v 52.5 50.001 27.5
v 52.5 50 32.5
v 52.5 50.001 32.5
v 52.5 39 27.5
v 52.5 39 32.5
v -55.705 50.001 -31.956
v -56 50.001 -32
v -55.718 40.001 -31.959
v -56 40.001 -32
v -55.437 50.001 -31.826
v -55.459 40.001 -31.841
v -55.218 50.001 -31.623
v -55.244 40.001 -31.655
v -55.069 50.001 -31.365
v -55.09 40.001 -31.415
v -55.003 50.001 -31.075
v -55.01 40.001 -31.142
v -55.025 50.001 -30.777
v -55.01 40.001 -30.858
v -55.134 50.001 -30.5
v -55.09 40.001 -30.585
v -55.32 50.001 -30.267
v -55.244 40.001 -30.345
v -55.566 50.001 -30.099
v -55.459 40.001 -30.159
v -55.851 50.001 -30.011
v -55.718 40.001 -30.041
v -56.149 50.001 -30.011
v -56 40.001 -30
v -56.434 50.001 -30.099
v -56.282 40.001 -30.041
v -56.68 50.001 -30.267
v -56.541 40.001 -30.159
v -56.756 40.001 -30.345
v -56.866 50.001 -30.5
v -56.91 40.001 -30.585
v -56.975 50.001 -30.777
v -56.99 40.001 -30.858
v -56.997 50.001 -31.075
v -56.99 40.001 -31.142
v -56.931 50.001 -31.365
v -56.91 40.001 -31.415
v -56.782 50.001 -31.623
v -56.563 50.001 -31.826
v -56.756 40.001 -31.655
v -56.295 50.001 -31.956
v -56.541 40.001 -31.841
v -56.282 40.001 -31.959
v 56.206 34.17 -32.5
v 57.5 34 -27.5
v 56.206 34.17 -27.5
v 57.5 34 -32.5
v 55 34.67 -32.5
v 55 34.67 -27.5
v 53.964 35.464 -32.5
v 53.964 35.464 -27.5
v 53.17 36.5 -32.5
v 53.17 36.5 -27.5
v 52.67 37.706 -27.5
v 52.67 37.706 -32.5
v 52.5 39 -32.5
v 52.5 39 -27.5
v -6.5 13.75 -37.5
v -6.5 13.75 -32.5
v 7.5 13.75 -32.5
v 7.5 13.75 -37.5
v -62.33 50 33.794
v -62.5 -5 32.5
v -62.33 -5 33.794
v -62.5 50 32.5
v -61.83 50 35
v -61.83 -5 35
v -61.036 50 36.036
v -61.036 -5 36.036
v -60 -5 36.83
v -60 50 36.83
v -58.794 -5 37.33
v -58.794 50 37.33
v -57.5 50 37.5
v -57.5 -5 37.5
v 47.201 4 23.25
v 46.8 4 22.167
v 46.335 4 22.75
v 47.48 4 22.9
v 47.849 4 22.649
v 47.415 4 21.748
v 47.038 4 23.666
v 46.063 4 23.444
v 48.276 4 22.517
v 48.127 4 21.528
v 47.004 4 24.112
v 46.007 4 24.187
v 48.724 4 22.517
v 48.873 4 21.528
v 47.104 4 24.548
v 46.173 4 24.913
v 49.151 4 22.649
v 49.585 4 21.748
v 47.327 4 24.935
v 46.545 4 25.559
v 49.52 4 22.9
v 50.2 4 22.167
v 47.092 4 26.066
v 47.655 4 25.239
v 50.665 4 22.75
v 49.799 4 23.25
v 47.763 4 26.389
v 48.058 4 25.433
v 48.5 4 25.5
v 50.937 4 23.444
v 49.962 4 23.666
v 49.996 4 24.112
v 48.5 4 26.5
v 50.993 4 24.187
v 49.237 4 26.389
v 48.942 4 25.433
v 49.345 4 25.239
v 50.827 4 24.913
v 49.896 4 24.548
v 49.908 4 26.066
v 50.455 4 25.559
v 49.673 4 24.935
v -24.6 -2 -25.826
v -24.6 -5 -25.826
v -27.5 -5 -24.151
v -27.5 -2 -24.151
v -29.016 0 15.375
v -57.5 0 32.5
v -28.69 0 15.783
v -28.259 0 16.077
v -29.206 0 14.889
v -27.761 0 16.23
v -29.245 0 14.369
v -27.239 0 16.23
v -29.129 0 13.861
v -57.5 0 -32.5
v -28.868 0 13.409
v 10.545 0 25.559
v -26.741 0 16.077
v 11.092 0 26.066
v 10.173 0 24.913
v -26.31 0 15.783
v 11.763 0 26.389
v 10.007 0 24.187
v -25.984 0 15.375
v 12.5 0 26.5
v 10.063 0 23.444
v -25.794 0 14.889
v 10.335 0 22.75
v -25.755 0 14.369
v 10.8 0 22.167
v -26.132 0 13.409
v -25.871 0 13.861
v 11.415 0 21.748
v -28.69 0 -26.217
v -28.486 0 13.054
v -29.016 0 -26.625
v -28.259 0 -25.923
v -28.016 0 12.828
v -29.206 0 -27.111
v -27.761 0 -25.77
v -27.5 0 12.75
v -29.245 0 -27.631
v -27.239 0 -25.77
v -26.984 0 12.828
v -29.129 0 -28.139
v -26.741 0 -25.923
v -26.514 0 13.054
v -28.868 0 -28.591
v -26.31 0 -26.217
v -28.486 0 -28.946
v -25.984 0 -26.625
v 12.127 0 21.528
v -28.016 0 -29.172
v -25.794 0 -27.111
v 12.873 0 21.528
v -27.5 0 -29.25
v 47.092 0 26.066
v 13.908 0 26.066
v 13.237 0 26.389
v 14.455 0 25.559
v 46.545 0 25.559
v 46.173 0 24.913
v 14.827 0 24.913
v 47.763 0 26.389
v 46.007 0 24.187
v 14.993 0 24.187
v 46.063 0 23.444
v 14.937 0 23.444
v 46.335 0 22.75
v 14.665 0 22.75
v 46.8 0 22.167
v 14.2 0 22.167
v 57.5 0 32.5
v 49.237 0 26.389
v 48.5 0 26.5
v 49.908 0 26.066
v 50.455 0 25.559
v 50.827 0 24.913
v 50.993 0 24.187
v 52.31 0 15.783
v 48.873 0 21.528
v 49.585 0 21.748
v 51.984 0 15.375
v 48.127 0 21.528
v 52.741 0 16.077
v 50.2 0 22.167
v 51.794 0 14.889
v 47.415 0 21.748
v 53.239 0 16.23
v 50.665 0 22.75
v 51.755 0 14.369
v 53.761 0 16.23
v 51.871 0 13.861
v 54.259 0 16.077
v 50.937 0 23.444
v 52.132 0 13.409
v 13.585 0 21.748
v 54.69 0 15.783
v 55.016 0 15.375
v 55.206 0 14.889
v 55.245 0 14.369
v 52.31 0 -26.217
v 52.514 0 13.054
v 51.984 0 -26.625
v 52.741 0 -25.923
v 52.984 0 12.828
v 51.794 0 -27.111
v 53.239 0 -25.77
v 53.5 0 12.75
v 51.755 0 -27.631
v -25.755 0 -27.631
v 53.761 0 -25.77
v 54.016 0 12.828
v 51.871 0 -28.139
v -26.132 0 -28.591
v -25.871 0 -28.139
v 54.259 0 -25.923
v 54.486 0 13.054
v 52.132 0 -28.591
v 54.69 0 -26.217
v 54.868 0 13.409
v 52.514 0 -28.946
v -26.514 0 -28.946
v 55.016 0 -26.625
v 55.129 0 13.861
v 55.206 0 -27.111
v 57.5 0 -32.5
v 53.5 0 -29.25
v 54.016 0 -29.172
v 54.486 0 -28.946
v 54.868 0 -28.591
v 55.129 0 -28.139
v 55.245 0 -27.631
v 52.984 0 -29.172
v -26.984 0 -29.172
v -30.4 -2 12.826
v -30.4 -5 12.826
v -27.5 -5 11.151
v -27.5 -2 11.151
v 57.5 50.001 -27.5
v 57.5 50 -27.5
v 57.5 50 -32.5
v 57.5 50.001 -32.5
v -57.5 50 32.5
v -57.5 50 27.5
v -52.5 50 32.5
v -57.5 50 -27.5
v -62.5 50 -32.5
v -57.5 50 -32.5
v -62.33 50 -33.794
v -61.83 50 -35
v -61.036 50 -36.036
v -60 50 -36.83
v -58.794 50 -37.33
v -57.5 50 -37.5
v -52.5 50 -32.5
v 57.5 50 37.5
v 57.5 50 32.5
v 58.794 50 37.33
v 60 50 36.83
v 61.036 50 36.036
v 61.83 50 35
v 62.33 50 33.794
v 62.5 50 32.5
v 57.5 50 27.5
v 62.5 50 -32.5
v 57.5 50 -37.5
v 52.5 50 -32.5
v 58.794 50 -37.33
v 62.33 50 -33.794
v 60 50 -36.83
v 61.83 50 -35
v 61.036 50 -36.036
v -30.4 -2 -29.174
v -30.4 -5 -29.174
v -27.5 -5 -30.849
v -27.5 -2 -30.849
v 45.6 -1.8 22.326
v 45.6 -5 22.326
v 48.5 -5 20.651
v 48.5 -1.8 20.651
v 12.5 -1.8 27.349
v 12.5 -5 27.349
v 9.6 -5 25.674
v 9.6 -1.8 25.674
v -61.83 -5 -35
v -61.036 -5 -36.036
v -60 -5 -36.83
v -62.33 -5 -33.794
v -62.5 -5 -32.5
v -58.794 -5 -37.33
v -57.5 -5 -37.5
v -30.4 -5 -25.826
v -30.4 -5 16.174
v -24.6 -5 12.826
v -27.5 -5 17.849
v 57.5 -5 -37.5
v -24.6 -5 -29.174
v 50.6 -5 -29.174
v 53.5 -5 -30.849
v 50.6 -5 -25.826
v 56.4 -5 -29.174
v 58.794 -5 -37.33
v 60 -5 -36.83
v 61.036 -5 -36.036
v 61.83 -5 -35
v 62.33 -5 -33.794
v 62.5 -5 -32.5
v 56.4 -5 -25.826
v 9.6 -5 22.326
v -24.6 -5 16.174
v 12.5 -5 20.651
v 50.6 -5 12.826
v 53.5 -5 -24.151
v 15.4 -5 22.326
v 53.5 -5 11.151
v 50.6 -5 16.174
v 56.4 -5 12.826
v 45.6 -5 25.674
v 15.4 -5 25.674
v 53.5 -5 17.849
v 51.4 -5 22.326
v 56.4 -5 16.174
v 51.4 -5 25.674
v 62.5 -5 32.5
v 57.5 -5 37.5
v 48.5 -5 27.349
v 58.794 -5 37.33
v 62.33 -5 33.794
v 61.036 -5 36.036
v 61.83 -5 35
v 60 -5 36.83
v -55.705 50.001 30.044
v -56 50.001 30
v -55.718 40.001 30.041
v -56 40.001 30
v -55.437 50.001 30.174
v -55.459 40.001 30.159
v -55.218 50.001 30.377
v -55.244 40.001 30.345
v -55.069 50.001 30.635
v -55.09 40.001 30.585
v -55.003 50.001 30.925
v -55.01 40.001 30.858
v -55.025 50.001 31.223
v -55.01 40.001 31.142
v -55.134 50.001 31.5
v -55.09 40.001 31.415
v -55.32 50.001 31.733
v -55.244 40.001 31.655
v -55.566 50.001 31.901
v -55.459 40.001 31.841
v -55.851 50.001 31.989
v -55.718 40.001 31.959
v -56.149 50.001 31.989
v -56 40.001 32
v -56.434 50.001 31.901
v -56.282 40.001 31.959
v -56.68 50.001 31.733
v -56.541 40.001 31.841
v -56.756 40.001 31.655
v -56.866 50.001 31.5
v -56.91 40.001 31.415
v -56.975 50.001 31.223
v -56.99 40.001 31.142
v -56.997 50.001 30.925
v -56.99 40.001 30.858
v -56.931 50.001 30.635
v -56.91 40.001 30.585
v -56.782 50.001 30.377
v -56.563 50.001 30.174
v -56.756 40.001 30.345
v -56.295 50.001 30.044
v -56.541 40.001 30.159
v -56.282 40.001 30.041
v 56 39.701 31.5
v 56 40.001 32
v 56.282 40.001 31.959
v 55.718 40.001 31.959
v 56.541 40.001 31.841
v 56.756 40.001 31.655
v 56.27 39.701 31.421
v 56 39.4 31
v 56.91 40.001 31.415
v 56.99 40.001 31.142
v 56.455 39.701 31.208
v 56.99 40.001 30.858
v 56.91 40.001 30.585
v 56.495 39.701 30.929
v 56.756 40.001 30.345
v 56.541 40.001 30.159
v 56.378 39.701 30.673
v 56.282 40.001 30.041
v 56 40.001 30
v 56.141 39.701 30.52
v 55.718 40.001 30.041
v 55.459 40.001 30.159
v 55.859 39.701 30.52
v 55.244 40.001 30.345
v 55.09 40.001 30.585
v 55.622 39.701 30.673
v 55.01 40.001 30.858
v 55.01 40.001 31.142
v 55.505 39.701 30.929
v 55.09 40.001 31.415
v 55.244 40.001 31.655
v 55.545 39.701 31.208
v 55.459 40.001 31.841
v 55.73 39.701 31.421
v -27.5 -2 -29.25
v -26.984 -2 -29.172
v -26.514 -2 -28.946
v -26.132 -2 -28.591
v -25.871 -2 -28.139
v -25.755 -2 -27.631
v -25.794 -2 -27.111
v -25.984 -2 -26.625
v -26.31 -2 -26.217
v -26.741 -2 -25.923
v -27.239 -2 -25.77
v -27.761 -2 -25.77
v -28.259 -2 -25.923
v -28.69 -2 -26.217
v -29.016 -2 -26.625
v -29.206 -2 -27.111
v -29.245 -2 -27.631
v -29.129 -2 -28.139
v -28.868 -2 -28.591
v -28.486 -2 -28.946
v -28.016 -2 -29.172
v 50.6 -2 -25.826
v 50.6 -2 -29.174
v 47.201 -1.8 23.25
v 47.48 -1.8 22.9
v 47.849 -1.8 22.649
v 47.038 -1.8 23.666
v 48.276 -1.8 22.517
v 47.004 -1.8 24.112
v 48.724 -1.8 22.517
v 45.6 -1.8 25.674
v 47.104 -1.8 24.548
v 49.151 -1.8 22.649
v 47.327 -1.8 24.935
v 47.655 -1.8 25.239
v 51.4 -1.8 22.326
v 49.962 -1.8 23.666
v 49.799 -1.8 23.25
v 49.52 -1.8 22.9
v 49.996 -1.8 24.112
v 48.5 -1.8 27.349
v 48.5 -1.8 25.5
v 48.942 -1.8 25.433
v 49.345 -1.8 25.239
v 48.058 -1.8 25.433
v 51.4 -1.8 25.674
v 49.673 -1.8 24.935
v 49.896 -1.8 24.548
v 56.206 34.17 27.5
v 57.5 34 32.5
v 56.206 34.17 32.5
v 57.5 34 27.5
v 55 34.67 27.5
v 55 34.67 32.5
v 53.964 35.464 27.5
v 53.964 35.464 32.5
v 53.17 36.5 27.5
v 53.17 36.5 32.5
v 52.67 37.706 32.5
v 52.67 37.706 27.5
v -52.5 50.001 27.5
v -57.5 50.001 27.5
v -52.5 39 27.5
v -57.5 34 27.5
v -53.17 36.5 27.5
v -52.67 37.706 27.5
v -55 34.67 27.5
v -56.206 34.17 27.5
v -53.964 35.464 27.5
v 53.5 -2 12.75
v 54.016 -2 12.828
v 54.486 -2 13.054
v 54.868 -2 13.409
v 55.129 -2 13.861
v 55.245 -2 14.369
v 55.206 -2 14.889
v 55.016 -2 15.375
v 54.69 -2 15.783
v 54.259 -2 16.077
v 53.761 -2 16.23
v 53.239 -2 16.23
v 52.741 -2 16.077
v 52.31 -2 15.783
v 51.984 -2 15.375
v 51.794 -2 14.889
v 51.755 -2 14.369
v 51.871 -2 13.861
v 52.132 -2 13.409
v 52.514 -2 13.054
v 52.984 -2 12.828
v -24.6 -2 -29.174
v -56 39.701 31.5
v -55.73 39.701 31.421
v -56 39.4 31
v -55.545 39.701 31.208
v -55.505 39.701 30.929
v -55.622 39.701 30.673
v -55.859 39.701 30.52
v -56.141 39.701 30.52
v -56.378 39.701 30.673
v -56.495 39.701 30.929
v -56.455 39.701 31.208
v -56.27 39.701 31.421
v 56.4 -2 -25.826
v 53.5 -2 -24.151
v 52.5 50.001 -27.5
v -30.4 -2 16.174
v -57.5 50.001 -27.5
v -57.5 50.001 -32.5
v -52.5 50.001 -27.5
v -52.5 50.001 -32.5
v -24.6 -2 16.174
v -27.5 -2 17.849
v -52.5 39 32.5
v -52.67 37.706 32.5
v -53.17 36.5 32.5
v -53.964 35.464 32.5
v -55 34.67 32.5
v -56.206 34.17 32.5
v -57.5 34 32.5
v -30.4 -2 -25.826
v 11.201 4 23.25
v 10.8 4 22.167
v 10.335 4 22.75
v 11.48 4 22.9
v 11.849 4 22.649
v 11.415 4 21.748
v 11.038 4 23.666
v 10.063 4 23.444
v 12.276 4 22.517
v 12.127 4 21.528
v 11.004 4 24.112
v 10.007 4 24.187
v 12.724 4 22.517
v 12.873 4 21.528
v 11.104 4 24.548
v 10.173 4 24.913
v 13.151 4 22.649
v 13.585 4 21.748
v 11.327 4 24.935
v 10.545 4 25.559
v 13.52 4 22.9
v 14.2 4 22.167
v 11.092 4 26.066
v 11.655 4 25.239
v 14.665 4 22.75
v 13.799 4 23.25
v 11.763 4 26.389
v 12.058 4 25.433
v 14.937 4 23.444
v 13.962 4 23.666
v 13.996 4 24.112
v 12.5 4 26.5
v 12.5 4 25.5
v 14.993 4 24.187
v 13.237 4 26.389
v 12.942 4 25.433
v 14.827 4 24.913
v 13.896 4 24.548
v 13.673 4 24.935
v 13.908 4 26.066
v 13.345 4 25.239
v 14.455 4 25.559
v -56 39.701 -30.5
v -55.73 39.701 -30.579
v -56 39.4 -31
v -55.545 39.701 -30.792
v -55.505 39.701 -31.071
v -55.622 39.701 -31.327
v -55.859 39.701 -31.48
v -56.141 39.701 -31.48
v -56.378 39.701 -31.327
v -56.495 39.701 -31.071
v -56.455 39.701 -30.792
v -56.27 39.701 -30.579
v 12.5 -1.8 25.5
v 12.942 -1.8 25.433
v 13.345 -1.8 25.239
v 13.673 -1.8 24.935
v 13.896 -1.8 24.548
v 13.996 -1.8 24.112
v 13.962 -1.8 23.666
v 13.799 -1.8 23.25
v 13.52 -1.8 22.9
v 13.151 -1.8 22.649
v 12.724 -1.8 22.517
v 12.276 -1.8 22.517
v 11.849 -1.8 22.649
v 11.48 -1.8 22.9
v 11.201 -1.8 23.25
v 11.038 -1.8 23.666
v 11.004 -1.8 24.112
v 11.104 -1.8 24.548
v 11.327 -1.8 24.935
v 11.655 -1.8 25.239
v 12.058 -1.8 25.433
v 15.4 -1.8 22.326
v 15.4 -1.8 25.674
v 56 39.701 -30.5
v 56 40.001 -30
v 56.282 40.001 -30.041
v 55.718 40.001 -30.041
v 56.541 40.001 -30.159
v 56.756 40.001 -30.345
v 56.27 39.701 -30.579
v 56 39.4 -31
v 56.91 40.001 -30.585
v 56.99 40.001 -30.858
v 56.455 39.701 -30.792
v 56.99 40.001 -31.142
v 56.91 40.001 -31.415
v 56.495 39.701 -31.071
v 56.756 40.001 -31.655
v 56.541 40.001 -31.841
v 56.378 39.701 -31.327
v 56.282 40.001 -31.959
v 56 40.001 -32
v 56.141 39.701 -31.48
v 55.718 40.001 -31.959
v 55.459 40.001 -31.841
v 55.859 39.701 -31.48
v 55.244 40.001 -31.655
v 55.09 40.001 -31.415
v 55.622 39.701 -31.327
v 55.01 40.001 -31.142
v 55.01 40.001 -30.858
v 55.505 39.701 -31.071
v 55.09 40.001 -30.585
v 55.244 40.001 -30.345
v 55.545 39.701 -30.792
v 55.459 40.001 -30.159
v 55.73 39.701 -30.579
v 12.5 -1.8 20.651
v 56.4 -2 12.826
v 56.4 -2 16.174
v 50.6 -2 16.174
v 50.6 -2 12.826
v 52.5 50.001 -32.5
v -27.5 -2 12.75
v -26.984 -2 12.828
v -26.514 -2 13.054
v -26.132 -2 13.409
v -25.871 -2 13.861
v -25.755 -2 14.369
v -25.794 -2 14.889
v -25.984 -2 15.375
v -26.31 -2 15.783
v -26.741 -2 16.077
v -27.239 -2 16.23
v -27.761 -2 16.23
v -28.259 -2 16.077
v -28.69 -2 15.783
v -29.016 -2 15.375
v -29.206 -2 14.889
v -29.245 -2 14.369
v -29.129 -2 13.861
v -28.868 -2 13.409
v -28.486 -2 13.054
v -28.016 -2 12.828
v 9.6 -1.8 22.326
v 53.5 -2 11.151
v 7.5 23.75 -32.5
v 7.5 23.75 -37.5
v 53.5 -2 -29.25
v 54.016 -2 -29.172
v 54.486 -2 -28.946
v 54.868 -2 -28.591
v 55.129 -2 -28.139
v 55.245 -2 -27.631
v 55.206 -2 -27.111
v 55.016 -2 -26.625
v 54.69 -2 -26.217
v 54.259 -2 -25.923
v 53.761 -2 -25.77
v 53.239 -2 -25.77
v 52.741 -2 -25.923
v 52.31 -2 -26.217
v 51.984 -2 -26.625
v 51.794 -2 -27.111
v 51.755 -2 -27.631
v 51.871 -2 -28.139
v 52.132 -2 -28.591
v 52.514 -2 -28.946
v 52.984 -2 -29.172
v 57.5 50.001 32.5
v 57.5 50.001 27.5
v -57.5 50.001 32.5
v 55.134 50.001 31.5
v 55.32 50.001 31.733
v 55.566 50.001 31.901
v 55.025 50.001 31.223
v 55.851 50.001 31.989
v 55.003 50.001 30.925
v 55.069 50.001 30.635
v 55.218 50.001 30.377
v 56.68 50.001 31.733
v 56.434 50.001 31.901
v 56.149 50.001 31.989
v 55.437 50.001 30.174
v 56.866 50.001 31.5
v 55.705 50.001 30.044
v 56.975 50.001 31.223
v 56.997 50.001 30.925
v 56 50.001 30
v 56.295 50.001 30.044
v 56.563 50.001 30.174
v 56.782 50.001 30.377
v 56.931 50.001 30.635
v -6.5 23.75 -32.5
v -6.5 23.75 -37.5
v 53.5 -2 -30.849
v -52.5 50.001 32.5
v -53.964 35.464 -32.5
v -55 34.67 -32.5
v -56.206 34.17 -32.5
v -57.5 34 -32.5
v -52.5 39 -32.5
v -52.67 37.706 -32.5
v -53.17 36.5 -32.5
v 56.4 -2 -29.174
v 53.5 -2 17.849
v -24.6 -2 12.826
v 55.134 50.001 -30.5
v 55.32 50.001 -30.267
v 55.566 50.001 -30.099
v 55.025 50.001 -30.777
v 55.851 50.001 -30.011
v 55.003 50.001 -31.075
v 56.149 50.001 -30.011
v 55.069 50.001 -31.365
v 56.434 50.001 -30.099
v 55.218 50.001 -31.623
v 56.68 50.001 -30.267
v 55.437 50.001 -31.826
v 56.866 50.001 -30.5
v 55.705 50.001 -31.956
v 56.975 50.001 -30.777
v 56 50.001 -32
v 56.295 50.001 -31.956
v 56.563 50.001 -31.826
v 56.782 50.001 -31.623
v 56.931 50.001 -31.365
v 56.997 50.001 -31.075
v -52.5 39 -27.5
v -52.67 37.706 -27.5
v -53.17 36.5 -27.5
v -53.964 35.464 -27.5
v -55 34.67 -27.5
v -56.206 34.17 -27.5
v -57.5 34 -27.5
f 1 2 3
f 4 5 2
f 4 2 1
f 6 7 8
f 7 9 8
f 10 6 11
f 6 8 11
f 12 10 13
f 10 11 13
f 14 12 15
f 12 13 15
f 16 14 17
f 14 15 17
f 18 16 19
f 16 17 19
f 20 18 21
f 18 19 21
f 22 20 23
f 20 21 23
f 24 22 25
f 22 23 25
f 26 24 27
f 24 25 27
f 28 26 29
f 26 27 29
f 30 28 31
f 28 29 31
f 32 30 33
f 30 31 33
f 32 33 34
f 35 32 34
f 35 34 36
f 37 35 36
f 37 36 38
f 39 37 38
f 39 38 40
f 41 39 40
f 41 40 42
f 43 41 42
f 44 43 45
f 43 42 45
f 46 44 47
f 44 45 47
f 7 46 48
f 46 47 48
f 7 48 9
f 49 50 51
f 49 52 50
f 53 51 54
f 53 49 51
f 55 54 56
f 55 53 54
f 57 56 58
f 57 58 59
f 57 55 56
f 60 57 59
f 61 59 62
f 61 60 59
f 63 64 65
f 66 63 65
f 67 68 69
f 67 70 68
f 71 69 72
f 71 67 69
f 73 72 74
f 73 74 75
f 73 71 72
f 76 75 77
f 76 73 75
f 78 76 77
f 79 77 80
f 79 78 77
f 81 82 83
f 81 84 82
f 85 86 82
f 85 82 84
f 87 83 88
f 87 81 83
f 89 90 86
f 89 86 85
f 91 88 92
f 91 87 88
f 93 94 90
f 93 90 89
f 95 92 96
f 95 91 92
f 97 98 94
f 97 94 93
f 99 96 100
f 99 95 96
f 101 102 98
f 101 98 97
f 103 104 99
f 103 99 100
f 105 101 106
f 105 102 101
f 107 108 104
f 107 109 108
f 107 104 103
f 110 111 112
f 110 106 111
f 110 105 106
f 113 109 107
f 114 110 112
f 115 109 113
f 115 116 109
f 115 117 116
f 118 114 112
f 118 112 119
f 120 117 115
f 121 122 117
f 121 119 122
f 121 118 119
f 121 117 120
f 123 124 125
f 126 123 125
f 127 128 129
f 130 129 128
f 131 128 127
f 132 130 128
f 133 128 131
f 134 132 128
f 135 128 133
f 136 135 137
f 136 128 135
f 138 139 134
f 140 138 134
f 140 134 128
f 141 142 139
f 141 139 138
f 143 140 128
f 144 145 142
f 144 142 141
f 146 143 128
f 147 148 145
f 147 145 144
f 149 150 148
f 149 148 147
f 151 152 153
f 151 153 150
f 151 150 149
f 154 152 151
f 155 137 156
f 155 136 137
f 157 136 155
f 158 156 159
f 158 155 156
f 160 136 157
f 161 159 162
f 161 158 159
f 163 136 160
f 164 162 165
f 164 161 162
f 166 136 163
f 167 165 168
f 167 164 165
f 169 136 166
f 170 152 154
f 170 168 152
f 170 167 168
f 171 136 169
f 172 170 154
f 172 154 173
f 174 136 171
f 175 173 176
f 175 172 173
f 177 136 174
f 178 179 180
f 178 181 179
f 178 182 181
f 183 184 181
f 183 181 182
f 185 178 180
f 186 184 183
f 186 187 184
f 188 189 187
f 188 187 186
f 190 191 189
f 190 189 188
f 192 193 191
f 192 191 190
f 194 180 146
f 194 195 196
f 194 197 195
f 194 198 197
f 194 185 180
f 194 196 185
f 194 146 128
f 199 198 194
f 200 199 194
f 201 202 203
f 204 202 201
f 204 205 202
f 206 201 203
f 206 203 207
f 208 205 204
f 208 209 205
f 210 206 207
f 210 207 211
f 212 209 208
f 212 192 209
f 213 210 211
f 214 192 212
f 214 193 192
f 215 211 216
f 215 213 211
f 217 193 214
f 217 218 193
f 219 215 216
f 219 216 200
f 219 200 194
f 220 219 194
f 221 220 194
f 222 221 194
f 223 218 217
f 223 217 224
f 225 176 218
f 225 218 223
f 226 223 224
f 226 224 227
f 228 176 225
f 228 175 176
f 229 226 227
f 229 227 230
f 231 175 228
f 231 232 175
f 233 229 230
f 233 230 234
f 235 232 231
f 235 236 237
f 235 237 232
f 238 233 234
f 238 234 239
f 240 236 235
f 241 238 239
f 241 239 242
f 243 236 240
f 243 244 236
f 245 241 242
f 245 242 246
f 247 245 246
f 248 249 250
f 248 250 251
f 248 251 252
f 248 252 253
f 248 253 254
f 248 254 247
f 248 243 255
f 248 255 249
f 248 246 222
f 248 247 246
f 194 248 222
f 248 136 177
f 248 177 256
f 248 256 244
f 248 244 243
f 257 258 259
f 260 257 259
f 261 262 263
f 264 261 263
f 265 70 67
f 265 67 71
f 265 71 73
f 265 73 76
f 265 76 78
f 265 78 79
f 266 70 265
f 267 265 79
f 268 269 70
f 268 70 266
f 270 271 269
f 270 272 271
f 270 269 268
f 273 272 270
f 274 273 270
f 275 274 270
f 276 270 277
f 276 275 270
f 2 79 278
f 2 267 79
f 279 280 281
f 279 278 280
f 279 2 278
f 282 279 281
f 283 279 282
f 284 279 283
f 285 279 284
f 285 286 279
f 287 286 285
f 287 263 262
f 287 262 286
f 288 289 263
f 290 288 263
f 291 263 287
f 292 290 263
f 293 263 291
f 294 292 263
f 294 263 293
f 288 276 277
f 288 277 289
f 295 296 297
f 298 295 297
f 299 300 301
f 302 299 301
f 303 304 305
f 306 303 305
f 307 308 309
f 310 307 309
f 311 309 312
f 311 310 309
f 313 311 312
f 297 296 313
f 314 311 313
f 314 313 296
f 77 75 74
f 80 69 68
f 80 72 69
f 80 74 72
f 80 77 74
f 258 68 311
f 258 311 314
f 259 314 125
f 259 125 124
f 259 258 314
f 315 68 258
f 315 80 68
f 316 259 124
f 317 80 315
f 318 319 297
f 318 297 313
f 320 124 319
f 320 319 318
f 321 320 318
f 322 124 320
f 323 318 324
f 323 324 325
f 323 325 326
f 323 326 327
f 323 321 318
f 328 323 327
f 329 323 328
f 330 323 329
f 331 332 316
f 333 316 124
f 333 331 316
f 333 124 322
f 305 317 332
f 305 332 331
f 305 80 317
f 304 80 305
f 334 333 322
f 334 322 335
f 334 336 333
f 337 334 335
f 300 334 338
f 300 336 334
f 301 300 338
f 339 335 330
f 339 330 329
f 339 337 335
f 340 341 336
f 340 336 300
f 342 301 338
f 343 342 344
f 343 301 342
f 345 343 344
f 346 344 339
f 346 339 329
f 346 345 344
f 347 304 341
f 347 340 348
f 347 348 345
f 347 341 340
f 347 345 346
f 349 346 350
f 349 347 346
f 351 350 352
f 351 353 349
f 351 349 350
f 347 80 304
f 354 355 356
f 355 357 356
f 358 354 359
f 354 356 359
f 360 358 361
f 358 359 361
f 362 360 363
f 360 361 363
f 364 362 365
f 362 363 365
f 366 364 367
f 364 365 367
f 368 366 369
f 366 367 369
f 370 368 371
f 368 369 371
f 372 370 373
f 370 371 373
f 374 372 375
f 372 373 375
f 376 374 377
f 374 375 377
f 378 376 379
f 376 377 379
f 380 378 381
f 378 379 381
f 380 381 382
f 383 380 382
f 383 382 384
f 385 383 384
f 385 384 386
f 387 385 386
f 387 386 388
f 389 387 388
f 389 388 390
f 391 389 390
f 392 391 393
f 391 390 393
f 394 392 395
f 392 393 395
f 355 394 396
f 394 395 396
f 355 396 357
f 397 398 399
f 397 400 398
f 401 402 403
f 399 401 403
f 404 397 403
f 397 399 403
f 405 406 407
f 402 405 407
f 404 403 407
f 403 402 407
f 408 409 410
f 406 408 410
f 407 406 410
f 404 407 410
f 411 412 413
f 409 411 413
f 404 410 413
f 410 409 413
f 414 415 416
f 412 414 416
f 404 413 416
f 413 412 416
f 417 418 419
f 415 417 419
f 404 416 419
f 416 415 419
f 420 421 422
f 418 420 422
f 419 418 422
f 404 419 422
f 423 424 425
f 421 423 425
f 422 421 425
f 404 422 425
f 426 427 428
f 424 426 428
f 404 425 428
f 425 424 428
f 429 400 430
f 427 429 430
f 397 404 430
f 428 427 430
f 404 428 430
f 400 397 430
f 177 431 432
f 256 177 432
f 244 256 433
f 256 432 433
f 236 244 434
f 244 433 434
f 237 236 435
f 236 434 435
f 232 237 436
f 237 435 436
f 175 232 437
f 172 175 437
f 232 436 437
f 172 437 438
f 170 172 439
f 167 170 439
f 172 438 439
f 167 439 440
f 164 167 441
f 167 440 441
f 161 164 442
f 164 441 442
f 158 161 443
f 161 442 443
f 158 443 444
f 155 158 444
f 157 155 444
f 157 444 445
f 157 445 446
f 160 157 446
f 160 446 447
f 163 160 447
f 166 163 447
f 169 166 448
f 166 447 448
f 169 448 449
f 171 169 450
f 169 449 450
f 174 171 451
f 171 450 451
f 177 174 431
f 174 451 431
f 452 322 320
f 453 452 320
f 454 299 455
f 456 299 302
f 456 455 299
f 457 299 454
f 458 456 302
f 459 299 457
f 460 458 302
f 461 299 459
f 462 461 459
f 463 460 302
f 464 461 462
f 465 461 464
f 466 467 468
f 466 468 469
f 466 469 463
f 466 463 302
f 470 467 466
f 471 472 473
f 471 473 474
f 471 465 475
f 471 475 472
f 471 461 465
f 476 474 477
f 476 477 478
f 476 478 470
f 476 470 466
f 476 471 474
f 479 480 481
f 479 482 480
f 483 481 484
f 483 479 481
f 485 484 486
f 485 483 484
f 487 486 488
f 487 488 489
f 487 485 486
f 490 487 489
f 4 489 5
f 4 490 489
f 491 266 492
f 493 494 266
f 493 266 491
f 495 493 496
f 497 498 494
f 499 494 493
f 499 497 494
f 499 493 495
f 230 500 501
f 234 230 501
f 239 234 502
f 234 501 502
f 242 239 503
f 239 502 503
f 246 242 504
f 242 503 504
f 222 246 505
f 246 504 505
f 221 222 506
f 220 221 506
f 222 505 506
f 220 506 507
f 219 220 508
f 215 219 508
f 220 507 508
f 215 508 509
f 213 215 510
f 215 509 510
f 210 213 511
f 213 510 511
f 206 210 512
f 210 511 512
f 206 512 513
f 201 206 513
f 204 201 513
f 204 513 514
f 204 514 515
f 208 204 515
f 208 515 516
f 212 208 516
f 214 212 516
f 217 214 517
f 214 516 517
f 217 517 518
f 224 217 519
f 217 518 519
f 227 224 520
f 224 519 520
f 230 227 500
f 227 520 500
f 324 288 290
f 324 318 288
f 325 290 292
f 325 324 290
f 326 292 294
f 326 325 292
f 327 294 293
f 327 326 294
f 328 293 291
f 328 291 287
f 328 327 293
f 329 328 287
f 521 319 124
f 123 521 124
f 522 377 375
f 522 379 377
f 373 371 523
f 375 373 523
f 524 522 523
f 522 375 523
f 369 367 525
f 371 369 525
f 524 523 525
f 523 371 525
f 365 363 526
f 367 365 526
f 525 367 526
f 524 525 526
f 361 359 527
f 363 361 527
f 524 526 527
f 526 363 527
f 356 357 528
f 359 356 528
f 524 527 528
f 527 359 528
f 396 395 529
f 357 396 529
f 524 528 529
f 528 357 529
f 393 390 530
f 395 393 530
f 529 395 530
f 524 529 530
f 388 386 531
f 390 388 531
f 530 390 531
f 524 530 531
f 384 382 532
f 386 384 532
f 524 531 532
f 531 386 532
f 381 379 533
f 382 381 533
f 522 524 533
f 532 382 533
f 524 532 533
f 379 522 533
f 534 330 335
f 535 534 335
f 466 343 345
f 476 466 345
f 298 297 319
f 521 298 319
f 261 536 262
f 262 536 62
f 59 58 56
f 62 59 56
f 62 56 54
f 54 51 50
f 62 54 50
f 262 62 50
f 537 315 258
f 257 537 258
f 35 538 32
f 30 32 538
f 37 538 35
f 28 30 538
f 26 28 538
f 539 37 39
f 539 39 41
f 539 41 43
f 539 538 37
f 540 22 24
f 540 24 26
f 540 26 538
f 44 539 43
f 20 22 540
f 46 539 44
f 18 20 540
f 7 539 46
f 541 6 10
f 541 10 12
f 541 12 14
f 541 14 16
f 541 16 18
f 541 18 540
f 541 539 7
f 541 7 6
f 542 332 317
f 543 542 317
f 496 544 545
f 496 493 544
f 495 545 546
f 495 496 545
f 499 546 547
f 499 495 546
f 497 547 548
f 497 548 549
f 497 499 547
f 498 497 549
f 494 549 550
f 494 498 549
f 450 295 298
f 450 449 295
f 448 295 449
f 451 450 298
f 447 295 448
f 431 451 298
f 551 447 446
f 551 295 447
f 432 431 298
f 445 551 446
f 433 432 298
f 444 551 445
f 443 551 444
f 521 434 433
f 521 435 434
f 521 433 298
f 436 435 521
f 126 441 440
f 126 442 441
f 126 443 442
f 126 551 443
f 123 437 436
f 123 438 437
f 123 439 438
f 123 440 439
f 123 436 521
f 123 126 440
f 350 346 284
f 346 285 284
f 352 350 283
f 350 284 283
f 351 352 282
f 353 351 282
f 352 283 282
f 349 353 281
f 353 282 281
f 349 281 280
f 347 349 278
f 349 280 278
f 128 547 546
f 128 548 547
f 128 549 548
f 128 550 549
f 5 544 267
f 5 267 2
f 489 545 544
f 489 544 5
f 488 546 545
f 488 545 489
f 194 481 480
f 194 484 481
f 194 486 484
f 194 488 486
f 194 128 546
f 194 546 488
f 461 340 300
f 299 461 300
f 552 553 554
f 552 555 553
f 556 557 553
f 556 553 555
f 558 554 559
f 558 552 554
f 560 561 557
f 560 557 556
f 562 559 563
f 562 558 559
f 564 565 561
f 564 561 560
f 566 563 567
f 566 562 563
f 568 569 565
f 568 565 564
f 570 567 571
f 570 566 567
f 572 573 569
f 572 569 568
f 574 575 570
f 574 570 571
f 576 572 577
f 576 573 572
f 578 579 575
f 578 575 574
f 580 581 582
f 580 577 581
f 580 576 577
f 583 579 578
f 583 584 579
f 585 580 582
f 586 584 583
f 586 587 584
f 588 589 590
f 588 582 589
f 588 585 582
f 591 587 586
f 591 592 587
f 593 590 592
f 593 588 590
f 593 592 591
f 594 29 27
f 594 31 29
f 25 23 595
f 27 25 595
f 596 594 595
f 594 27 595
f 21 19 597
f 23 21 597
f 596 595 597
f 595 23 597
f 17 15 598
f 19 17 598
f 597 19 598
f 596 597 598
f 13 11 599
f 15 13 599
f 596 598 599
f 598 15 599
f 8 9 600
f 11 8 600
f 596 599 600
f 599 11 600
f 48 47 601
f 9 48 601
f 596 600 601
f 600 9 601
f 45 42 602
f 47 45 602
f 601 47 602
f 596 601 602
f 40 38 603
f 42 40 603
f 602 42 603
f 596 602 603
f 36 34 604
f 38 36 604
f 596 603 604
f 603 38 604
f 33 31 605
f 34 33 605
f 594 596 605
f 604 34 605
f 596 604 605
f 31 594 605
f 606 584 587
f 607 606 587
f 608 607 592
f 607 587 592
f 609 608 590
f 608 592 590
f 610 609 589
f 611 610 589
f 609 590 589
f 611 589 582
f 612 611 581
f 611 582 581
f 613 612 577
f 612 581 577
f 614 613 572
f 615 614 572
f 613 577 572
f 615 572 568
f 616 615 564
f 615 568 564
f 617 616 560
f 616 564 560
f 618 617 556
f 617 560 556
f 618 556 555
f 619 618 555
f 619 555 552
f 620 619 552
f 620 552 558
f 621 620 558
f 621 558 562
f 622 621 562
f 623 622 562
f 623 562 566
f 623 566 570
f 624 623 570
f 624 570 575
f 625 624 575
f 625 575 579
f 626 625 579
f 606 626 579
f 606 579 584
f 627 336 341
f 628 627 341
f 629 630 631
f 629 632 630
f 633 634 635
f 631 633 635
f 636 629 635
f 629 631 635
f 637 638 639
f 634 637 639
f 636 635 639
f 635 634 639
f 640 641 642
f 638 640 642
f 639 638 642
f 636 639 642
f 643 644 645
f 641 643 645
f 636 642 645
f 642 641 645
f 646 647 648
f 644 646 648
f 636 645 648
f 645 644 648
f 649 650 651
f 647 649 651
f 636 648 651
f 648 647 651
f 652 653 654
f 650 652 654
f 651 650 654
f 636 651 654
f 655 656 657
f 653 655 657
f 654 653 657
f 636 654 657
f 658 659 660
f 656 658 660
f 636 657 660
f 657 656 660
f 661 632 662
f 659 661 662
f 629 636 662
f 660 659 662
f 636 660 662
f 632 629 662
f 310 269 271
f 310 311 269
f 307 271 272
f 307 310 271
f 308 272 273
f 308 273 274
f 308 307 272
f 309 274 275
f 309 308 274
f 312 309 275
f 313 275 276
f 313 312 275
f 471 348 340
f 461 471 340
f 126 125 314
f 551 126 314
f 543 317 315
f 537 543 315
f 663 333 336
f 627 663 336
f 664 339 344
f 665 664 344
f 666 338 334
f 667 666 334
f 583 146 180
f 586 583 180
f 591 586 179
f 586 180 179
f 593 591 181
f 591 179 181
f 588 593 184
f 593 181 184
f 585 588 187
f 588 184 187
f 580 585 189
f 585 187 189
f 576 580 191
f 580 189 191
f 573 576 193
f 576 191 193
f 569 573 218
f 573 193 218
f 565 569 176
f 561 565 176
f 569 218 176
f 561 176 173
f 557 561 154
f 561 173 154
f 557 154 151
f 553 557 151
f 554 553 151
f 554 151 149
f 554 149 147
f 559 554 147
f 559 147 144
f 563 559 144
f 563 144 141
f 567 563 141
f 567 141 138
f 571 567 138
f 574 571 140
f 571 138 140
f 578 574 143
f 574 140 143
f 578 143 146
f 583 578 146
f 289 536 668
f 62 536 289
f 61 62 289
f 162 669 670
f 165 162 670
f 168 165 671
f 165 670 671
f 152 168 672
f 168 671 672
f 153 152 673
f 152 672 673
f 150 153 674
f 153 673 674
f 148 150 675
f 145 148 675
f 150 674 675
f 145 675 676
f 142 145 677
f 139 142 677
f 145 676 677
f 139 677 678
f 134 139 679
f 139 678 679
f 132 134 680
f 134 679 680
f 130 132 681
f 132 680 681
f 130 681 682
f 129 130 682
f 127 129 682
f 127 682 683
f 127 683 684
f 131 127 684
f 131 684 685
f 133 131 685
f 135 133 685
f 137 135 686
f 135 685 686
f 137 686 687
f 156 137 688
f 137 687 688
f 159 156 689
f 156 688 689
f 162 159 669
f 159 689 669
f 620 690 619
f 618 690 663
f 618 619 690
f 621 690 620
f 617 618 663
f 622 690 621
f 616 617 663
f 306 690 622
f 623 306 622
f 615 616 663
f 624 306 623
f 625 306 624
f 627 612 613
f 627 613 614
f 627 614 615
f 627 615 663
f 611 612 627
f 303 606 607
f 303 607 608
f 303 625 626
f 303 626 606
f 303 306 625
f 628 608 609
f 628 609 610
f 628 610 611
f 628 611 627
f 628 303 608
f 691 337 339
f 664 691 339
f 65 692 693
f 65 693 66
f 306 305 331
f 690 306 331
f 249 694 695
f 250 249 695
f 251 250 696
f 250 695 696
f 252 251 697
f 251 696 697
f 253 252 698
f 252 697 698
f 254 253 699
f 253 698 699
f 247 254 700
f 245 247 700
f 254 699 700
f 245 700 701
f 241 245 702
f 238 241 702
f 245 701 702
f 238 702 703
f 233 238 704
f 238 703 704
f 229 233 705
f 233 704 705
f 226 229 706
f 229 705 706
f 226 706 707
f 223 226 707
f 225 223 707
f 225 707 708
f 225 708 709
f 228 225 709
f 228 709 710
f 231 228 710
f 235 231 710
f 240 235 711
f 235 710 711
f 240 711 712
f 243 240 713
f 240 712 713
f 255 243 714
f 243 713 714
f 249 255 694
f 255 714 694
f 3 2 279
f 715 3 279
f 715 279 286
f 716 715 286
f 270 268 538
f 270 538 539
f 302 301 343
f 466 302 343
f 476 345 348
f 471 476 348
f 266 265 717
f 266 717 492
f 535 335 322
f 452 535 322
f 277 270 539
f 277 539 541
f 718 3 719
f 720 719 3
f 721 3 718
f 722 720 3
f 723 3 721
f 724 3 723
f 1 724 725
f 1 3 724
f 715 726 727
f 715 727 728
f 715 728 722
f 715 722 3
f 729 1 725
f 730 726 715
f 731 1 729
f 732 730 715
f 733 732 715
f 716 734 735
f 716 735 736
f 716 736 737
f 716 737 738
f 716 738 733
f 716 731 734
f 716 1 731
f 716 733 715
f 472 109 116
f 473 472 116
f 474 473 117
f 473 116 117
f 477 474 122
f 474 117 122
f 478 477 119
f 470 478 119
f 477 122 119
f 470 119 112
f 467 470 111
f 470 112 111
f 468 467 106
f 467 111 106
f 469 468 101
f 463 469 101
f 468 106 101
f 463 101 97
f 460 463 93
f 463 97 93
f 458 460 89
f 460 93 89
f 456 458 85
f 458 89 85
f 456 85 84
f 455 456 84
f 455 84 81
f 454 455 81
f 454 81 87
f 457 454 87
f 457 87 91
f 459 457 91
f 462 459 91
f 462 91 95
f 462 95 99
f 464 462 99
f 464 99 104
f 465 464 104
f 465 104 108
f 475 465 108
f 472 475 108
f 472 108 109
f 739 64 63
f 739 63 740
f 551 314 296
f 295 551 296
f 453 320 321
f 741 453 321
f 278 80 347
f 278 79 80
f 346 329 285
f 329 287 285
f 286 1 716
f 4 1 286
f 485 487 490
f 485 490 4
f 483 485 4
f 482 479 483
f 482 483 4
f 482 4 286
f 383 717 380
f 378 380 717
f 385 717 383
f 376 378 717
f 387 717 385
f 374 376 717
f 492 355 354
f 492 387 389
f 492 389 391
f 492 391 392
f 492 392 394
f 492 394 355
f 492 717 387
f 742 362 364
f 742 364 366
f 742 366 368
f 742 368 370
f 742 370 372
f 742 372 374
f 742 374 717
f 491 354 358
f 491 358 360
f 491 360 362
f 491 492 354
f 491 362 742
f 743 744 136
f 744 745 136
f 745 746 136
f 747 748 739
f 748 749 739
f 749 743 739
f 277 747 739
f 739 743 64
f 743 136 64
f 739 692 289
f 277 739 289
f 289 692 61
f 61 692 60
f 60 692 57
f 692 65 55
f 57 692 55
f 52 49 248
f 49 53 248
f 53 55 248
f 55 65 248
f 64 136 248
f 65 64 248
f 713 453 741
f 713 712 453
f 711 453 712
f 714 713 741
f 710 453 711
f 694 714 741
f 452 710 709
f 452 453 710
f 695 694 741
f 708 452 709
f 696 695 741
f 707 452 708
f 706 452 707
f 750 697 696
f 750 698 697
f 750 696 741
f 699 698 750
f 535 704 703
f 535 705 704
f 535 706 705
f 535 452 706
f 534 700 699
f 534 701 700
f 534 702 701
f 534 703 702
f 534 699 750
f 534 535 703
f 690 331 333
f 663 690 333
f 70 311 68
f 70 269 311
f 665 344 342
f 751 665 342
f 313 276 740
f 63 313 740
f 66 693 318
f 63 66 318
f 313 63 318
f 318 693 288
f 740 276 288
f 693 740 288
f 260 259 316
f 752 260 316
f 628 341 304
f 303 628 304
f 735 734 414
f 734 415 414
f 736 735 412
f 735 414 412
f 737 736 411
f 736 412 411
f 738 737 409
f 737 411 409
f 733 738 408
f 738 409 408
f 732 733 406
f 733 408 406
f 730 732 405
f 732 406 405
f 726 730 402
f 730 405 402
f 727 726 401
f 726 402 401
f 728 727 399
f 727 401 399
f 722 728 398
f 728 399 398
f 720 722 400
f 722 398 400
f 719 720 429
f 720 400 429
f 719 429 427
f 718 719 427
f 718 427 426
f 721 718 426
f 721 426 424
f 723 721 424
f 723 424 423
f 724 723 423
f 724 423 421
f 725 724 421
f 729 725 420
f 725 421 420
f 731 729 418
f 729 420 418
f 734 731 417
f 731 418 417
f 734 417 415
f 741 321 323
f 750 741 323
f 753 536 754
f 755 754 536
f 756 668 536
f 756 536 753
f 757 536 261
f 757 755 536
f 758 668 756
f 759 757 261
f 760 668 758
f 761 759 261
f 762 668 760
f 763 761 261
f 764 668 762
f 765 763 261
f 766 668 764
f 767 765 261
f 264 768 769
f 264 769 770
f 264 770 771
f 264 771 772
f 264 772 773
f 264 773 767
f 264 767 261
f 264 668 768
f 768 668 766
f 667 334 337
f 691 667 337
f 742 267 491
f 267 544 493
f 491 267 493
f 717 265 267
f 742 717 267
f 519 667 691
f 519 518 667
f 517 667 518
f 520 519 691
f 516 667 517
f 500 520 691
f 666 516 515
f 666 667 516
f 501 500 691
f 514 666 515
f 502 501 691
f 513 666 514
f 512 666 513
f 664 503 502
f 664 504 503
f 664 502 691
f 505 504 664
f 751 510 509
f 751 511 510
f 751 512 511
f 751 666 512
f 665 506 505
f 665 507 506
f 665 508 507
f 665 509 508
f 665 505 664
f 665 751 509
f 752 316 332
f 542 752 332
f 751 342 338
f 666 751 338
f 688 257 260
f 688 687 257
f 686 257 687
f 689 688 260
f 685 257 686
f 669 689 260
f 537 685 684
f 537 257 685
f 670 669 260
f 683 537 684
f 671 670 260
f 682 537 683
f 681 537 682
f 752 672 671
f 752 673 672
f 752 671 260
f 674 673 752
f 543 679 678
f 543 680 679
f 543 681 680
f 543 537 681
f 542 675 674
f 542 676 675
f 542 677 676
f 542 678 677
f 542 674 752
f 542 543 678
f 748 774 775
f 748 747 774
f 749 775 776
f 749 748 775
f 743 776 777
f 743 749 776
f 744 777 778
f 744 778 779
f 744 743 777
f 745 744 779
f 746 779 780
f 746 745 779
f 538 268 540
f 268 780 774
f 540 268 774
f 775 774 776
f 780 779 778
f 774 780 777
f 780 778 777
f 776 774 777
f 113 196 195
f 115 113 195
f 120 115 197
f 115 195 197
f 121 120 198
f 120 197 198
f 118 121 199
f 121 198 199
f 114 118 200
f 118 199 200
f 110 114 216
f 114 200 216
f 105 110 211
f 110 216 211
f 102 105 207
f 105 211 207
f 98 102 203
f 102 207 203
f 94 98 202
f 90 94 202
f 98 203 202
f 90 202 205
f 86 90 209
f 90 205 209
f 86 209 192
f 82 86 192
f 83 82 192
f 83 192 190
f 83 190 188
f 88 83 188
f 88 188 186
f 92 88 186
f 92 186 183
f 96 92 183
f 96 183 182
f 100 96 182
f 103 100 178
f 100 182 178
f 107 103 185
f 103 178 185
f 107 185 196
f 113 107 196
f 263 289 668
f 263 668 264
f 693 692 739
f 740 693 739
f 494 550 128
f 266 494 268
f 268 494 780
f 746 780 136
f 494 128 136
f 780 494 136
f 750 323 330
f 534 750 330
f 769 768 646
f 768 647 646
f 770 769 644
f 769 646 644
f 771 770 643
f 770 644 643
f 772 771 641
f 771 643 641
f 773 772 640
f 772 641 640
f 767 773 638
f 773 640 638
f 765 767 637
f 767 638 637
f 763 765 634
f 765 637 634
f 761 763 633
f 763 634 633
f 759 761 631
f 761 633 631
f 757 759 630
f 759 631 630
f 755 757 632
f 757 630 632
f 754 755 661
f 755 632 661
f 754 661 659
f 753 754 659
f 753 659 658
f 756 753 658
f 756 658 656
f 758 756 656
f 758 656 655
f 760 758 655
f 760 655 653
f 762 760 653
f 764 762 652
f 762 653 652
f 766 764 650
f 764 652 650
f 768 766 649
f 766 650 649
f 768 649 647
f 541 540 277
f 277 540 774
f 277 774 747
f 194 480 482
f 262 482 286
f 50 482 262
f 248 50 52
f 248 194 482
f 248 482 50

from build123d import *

# Parameters (mm, degrees)
CROQUIS1_W                        = 125
CROQUIS1_H                        = 75
CROQUIS1_W_2                      = 115
CROQUIS1_H_2                      = 65
SALIENTE_EXTRUIR1_DEPTH           = 50
CROQUIS2_W                        = 125
CROQUIS2_H                        = 75
SALIENTE_EXTRUIR2_DEPTH           = 5
REDONDEO1_R                       = 5
SALIENTE_EXTRUIR3_DEPTH           = 10
CORTAR_EXTRUIR1_DEPTH             = 8
CROQUIS6_R                        = 1.75
CORTAR_EXTRUIR4_DEPTH             = 2
CORTAR_EXTRUIR5_DEPTH             = 5
SALIENTE_EXTRUIR4_DEPTH           = 0.001
SALIENTE_EXTRUIR4_DEPTH_BACK      = 16
CROQUIS8_W                        = 5
CROQUIS8_H                        = 5
REDONDEO2_R                       = 5
DI_METRO_DE_TALADRO_2_0_2_4_D     = 2
DI_METRO_DE_TALADRO_2_0_2_4_DEPTH = 10
DI_METRO_DE_TALADRO_2_0_2_4_TIP   = 0.600860619
CROQUIS11_R                       = 2.5
SALIENTE_EXTRUIR5_DEPTH           = 4
CROQUIS13_R                       = 1.5
CORTAR_EXTRUIR6_DEPTH             = 9
CORTAR_EXTRUIR7_DEPTH             = 3.2


with BuildPart() as part:
    # Croquis1 → Saliente-Extruir1 (new body)
    with BuildSketch(Plane(origin=(0, 0, 0), x_dir=(1, 0, 0), z_dir=(0, 1, 0))):
        Rectangle(CROQUIS1_W, CROQUIS1_H)
        Rectangle(CROQUIS1_W_2, CROQUIS1_H_2, mode=Mode.SUBTRACT)
    extrude(amount=SALIENTE_EXTRUIR1_DEPTH)

    # Croquis2 → Saliente-Extruir2 (add)
    with BuildSketch(Plane.XZ):
        Rectangle(CROQUIS2_W, CROQUIS2_H)
    extrude(amount=SALIENTE_EXTRUIR2_DEPTH)

    # Redondeo1
    redondeo1_edges = [part.edges().sort_by_distance(p)[0] for p in [
        (62.5, 22.5, 37.5),
        (-62.5, 22.5, 37.5),
        (-62.5, 22.5, -37.5),
        (62.5, 22.5, -37.5),
    ]]
    fillet(redondeo1_edges, radius=REDONDEO1_R)

    # Croquis3 → Saliente-Extruir3 (add)
    with BuildSketch(Plane(origin=(0, 0, 0), x_dir=(1, 0, 0), z_dir=(0, 1, 0))):
        Polygon((53.5, 24.151368439), (56.4, 25.825684219), (56.4, 29.174315781), (53.5, 30.848631561), (50.6, 29.174315781), (50.6, 25.825684219), align=None)
        Polygon((-24.6, 25.825684219), (-27.5, 24.151368439), (-30.4, 25.825684219), (-30.4, 29.174315781), (-27.5, 30.848631561), (-24.6, 29.174315781), align=None)
        Polygon((-24.6, -16.174315781), (-24.6, -12.825684219), (-27.5, -11.151368439), (-30.4, -12.825684219), (-30.4, -16.174315781), (-27.5, -17.848631561), align=None)
        Polygon((50.6, -12.825684219), (53.5, -11.151368439), (56.4, -12.825684219), (56.4, -16.174315781), (53.5, -17.848631561), (50.6, -16.174315781), align=None)
    extrude(amount=-SALIENTE_EXTRUIR3_DEPTH)

    # Croquis4 → Cortar-Extruir1 (cut)
    with BuildSketch(Plane.XZ.offset(10)):
        Polygon((53.5, -24.151368439), (50.6, -25.825684219), (50.6, -29.174315781), (53.5, -30.848631561), (56.4, -29.174315781), (56.4, -25.825684219), align=None)
        Polygon((50.6, 16.174315781), (50.6, 12.825684219), (53.5, 11.151368439), (56.4, 12.825684219), (56.4, 16.174315781), (53.5, 17.848631561), align=None)
        Polygon((-24.6, 16.174315781), (-27.5, 17.848631561), (-30.4, 16.174315781), (-30.4, 12.825684219), (-27.5, 11.151368439), (-24.6, 12.825684219), align=None)
        Polygon((-24.6, -29.174315781), (-24.6, -25.825684219), (-27.5, -24.151368439), (-30.4, -25.825684219), (-30.4, -29.174315781), (-27.5, -30.848631561), align=None)
    extrude(amount=-CORTAR_EXTRUIR1_DEPTH, mode=Mode.SUBTRACT)

    # Croquis6 → Cortar-Extruir4 (cut)
    with BuildSketch(Plane.XZ.offset(2)):
        with Locations(Location((53.5, -27.5, 0), (0, 0, 270))):
            Circle(CROQUIS6_R)
        with Locations(Location((-27.5, -27.5, 0), (0, 0, 270))):
            Circle(CROQUIS6_R)
        with Locations(Location((-27.5, 14.5, 0), (0, 0, 270))):
            Circle(CROQUIS6_R)
        with Locations(Location((53.5, 14.5, 0), (0, 0, 270))):
            Circle(CROQUIS6_R)
    extrude(amount=-CORTAR_EXTRUIR4_DEPTH, mode=Mode.SUBTRACT)

    # Croquis7 → Cortar-Extruir5 (cut)
    with BuildSketch(Plane.XY.offset(-32.5)):
        Polygon((-3.928571429, 23.75), (7.5, 23.75), (7.5, 13.75), (-5.131578947, 13.75), (-6.5, 13.75), (-6.5, 23.75), align=None)
    extrude(amount=-CORTAR_EXTRUIR5_DEPTH, mode=Mode.SUBTRACT)

    # Croquis8 → Saliente-Extruir4 (add, two sides: drawn at the far end of the back side and taken through both)
    with BuildSketch(Plane(origin=(0, 50, 0), x_dir=(1, 0, 0), z_dir=(0, 1, 0)).offset(-SALIENTE_EXTRUIR4_DEPTH_BACK)):
        with Locations((-55, -30)):
            Rectangle(CROQUIS8_W, CROQUIS8_H)
        with Locations((55, -30)):
            Rectangle(CROQUIS8_W, CROQUIS8_H)
        with Locations((55, 30)):
            Rectangle(CROQUIS8_W, CROQUIS8_H)
        with Locations((-55, 30)):
            Rectangle(CROQUIS8_W, CROQUIS8_H)
    extrude(amount=SALIENTE_EXTRUIR4_DEPTH + SALIENTE_EXTRUIR4_DEPTH_BACK)

    # Redondeo2
    redondeo2_edges = [part.edges().sort_by_distance(p)[0] for p in [
        (-52.5, 34, -30),
        (-52.5, 34, 30),
        (52.5, 34, 30),
        (52.5, 34, -30),
    ]]
    fillet(redondeo2_edges, radius=REDONDEO2_R - 0.0001)  # a hair under: the kernel refuses the full size

    # Diámetro de taladro Ø2.0 (2)4
    with Locations(Plane(origin=(-56, 50.001, -31), x_dir=(0, 0, 1), z_dir=(0, 1, 0))):
        with Locations((0, 0), (0, 112), (62, 112), (62, 0)):
            Hole(DI_METRO_DE_TALADRO_2_0_2_4_D / 2, depth=DI_METRO_DE_TALADRO_2_0_2_4_DEPTH)
            with Locations((0, 0, -(DI_METRO_DE_TALADRO_2_0_2_4_DEPTH + DI_METRO_DE_TALADRO_2_0_2_4_TIP / 2))):  # 118° drill point
                Cone(0, DI_METRO_DE_TALADRO_2_0_2_4_D / 2, DI_METRO_DE_TALADRO_2_0_2_4_TIP, mode=Mode.SUBTRACT)

    # Croquis11 → Saliente-Extruir5 (add)
    with BuildSketch(Plane(origin=(0, 0, 0), x_dir=(1, 0, 0), z_dir=(0, 1, 0))):
        with Locations(Location((12.5, -24, 0), (0, 0, 270))):
            Circle(CROQUIS11_R)
        with Locations(Location((48.5, -24, 0), (0, 0, 270))):
            Circle(CROQUIS11_R)
    extrude(amount=SALIENTE_EXTRUIR5_DEPTH)

    # Croquis13 → Cortar-Extruir6 (cut)
    with BuildSketch(Plane(origin=(0, 4, 0), x_dir=(1, 0, 0), z_dir=(0, 1, 0))):
        with Locations(Location((12.5, -24, 0), (0, 0, 270))):
            Circle(CROQUIS13_R)
        with Locations(Location((48.5, -24, 0), (0, 0, 270))):
            Circle(CROQUIS13_R)
    extrude(amount=-CORTAR_EXTRUIR6_DEPTH, mode=Mode.SUBTRACT)

    # Croquis14 → Cortar-Extruir7 (cut)
    with BuildSketch(Plane.XZ.offset(5)):
        Polygon((12.5, 20.651368439), (15.4, 22.325684219), (15.4, 25.674315781), (12.5, 27.348631561), (9.6, 25.674315781), (9.6, 22.325684219), align=None)
        Polygon((48.5, 20.651368439), (51.4, 22.325684219), (51.4, 25.674315781), (48.5, 27.348631561), (45.6, 25.674315781), (45.6, 22.325684219), align=None)
    extrude(amount=-CORTAR_EXTRUIR7_DEPTH, mode=Mode.SUBTRACT)


solid = part.part
